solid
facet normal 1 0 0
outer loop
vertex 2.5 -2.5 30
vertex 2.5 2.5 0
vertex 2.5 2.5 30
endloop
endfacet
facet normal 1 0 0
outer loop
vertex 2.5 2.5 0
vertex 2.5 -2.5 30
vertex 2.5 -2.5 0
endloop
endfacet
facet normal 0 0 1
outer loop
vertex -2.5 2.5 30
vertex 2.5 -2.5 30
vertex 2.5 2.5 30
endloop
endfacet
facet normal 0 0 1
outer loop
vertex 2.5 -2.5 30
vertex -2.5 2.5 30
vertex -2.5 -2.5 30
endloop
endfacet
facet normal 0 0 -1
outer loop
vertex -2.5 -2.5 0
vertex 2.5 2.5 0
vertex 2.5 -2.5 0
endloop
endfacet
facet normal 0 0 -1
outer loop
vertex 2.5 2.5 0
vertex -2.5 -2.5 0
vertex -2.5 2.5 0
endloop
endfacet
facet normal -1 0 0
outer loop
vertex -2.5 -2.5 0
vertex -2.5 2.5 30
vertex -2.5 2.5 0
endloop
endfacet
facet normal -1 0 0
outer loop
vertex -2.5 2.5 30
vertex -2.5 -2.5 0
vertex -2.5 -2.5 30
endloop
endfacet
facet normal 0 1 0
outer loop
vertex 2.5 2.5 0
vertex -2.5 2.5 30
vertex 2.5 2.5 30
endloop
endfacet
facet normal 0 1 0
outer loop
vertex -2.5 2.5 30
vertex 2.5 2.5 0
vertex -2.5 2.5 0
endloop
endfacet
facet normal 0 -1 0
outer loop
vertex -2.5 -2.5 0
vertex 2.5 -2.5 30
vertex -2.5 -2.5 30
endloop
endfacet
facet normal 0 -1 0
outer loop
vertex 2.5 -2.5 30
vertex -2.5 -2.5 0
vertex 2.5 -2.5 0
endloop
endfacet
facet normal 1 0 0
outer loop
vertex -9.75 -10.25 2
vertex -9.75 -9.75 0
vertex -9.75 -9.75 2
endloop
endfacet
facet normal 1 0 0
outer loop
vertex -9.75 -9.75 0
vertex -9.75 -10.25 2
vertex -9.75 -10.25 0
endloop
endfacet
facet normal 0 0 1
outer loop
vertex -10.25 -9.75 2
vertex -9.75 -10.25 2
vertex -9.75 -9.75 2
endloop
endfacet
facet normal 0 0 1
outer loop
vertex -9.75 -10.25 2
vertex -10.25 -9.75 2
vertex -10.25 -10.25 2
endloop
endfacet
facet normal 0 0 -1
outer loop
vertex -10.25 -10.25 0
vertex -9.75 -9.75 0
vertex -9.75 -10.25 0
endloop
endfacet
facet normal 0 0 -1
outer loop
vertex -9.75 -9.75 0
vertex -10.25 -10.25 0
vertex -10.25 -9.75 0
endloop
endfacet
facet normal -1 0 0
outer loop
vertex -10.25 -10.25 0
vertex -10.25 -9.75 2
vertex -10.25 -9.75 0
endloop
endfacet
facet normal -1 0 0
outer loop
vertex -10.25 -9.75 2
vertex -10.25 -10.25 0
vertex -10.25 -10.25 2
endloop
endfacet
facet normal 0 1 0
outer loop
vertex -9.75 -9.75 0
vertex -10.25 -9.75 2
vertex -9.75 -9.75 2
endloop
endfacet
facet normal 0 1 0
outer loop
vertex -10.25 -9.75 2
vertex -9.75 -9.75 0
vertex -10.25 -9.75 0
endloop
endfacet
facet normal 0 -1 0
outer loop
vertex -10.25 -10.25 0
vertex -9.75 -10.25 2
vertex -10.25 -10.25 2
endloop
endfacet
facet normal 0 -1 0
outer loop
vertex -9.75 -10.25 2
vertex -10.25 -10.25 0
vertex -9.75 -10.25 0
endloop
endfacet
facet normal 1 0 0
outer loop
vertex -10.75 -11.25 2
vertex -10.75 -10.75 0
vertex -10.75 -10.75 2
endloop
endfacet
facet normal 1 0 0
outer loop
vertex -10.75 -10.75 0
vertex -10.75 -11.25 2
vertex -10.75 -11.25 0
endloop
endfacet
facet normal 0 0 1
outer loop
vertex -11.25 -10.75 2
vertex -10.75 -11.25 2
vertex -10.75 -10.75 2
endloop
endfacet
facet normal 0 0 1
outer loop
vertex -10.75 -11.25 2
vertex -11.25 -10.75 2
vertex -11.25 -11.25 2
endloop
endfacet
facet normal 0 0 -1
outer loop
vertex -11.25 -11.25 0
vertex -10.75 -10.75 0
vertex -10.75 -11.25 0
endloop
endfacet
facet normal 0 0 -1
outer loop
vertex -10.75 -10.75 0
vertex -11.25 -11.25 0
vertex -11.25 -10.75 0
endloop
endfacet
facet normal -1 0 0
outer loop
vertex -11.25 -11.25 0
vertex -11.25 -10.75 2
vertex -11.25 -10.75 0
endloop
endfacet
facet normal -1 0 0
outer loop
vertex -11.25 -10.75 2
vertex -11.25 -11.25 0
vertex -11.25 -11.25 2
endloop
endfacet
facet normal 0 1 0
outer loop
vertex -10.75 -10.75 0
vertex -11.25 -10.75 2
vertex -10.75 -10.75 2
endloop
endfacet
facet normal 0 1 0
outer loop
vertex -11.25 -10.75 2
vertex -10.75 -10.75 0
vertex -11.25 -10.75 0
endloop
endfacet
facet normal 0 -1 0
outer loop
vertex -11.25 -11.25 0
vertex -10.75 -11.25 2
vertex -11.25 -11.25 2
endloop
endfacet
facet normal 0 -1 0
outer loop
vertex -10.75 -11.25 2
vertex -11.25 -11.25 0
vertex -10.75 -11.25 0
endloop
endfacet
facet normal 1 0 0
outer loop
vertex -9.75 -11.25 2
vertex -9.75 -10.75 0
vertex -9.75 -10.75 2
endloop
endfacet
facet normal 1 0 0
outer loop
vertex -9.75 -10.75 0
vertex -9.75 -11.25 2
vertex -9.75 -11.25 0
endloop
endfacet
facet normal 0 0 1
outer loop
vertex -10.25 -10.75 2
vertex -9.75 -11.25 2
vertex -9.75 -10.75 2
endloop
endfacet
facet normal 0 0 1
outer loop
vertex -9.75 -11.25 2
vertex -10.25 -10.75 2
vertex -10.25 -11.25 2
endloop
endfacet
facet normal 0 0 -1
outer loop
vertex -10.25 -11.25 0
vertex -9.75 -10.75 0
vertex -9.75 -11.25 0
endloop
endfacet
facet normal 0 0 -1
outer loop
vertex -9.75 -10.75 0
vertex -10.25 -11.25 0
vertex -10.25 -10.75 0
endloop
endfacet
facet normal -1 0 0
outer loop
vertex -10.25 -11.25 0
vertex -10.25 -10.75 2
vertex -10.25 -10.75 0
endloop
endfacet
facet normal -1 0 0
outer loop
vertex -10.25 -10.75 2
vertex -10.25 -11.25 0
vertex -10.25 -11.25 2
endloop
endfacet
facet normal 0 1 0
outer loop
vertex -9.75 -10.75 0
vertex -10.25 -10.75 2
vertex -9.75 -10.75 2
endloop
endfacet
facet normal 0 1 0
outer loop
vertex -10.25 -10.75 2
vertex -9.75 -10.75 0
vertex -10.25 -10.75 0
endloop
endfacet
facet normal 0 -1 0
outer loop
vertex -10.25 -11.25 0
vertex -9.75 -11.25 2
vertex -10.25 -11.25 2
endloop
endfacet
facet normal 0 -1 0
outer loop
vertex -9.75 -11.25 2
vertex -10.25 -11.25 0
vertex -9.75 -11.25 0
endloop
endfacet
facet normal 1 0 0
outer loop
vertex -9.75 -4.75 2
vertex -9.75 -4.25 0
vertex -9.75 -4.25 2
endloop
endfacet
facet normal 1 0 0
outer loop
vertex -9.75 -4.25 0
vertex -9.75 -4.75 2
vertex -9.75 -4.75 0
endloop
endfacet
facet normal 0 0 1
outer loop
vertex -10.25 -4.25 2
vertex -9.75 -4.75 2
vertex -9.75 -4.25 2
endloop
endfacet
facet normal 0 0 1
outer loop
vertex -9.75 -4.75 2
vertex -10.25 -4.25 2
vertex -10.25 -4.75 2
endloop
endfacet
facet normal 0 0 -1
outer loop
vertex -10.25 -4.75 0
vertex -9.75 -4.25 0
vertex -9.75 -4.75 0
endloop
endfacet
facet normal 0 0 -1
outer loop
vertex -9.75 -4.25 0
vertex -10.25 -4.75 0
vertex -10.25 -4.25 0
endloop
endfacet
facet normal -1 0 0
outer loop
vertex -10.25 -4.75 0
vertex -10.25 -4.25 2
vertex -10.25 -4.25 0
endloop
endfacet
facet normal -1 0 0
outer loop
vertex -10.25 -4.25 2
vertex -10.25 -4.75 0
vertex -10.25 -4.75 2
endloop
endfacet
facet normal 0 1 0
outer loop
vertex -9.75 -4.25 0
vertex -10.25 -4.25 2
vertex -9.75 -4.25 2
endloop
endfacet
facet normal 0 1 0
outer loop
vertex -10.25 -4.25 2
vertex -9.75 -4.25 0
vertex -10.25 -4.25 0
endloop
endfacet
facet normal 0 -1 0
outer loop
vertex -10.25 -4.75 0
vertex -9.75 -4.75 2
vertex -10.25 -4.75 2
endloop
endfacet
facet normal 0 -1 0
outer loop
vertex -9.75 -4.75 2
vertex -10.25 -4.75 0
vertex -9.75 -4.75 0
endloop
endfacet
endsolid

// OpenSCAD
translate([0, 0, 15]) color([0,1,0]) cube([5, 5, 30], center=true);
translate([-10, -10, 1]) color([1,0,0]) cube([0.5, 0.5, 2], center=true);
translate([-11, -11, 1]) color([1,0,0]) cube([0.5, 0.5, 2], center=true);
translate([-10, -11, 1]) color([1,0,0]) cube([0.5, 0.5, 2], center=true);
translate([-10, -4.5, 1]) color([1,0,0]) cube([0.5, 0.5, 2], center=true);
